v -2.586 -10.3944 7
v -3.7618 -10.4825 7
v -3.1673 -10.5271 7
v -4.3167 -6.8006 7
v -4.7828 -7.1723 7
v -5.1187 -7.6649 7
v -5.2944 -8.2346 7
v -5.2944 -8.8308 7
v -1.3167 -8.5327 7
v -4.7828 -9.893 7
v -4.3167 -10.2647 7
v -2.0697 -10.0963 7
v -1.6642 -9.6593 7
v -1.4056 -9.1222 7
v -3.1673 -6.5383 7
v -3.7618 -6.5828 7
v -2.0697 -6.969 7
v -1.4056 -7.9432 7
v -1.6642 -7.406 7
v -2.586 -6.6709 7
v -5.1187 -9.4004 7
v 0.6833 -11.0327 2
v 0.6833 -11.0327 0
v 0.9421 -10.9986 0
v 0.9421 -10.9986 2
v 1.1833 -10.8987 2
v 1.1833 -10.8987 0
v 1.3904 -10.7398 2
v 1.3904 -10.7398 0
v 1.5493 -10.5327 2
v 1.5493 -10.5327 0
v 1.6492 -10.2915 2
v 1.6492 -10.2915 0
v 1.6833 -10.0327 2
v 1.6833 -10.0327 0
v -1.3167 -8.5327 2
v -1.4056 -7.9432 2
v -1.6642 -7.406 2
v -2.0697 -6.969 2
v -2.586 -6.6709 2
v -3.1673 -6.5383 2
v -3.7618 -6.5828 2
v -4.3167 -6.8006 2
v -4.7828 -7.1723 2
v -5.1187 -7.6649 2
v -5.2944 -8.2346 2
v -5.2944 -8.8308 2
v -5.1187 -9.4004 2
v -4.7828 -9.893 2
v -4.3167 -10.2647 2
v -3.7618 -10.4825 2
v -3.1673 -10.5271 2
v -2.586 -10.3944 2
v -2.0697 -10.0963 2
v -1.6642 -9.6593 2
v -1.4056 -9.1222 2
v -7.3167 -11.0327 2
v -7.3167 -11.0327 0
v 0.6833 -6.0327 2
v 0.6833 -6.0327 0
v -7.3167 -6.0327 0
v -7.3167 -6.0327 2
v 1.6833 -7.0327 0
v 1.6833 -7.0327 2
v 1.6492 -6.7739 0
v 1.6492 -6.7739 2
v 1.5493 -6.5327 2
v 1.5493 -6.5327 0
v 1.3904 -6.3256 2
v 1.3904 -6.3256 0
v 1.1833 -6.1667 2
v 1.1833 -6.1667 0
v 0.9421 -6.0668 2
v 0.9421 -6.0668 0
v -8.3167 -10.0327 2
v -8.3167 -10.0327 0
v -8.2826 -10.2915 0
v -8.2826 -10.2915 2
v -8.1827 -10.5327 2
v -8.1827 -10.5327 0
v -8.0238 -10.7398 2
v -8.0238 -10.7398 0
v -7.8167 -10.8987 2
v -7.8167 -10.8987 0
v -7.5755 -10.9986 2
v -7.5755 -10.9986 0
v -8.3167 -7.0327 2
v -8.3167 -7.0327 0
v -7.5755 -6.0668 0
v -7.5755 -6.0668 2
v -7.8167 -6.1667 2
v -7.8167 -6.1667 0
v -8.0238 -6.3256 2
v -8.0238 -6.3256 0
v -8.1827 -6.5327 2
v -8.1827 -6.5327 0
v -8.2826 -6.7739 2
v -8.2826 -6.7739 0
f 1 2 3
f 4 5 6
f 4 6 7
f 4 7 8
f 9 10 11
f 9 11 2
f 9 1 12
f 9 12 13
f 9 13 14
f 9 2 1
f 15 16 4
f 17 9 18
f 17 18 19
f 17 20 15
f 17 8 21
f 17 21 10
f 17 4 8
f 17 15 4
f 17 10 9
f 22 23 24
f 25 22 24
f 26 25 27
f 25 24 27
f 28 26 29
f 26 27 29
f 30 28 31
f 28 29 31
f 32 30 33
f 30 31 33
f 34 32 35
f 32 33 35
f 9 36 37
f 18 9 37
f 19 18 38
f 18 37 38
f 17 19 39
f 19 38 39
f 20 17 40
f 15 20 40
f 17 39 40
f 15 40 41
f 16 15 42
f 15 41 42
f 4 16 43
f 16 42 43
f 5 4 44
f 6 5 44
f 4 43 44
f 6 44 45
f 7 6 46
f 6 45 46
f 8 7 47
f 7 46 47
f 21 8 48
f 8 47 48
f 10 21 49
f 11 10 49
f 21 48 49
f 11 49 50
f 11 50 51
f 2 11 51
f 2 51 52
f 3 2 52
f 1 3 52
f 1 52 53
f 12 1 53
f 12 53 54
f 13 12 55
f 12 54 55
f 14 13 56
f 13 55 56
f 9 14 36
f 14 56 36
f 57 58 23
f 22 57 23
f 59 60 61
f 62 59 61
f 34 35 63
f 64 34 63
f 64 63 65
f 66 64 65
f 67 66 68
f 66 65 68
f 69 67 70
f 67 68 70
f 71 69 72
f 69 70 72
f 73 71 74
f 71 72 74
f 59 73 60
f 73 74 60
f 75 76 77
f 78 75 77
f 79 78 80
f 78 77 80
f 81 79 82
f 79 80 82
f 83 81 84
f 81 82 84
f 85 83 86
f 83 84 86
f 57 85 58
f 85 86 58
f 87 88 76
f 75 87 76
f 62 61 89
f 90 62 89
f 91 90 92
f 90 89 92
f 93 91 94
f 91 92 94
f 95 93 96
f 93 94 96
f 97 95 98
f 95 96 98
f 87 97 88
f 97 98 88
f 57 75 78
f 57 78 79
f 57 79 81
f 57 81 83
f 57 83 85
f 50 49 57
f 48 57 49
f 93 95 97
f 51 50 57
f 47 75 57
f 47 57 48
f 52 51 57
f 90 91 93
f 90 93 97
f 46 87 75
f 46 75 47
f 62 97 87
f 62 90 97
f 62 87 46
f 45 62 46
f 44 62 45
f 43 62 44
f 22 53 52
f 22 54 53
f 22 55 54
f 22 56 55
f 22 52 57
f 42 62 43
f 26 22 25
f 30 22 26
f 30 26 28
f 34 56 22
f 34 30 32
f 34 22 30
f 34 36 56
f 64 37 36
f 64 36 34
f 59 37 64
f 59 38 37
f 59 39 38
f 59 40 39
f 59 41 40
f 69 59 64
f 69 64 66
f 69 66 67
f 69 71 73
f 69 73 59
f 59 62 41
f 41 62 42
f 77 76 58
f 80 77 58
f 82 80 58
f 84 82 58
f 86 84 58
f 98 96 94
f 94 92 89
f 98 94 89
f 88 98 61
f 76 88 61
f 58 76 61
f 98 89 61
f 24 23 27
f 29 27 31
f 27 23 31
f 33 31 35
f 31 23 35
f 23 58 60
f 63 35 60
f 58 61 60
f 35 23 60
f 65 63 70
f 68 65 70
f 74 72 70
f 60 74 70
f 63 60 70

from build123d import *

# Parameters (mm, degrees)
F1_DEPTH = 2
F2_R     = 2
F3_DEPTH = 5


with BuildPart() as f1:
    # F0 (on Top) → F1 (new body)
    with BuildSketch(Plane.XY):
        with BuildLine():
            Line((0.68328, -6.032679), (-7.31672, -6.032679))
            ThreePointArc((-7.31672, -6.032679), (-8.023827, -6.325572), (-8.31672, -7.032679))
            Line((-8.31672, -7.032679), (-8.31672, -10.032679))
            ThreePointArc((-8.31672, -10.032679), (-8.023827, -10.739785), (-7.31672, -11.032679))
            Line((-7.31672, -11.032679), (0.68328, -11.032679))
            ThreePointArc((0.68328, -11.032679), (1.390386, -10.739785), (1.68328, -10.032679))
            Line((1.68328, -10.032679), (1.68328, -7.032679))
            ThreePointArc((1.68328, -7.032679), (1.390386, -6.325572), (0.68328, -6.032679))
        make_face()
    extrude(amount=F1_DEPTH)

    # F2 (on face) → F3 (join)
    with BuildSketch(Plane.XY.offset(2)):
        with Locations((-3.31672, -8.532679)):
            Circle(F2_R)
    extrude(amount=F3_DEPTH)


solid = f1.part
